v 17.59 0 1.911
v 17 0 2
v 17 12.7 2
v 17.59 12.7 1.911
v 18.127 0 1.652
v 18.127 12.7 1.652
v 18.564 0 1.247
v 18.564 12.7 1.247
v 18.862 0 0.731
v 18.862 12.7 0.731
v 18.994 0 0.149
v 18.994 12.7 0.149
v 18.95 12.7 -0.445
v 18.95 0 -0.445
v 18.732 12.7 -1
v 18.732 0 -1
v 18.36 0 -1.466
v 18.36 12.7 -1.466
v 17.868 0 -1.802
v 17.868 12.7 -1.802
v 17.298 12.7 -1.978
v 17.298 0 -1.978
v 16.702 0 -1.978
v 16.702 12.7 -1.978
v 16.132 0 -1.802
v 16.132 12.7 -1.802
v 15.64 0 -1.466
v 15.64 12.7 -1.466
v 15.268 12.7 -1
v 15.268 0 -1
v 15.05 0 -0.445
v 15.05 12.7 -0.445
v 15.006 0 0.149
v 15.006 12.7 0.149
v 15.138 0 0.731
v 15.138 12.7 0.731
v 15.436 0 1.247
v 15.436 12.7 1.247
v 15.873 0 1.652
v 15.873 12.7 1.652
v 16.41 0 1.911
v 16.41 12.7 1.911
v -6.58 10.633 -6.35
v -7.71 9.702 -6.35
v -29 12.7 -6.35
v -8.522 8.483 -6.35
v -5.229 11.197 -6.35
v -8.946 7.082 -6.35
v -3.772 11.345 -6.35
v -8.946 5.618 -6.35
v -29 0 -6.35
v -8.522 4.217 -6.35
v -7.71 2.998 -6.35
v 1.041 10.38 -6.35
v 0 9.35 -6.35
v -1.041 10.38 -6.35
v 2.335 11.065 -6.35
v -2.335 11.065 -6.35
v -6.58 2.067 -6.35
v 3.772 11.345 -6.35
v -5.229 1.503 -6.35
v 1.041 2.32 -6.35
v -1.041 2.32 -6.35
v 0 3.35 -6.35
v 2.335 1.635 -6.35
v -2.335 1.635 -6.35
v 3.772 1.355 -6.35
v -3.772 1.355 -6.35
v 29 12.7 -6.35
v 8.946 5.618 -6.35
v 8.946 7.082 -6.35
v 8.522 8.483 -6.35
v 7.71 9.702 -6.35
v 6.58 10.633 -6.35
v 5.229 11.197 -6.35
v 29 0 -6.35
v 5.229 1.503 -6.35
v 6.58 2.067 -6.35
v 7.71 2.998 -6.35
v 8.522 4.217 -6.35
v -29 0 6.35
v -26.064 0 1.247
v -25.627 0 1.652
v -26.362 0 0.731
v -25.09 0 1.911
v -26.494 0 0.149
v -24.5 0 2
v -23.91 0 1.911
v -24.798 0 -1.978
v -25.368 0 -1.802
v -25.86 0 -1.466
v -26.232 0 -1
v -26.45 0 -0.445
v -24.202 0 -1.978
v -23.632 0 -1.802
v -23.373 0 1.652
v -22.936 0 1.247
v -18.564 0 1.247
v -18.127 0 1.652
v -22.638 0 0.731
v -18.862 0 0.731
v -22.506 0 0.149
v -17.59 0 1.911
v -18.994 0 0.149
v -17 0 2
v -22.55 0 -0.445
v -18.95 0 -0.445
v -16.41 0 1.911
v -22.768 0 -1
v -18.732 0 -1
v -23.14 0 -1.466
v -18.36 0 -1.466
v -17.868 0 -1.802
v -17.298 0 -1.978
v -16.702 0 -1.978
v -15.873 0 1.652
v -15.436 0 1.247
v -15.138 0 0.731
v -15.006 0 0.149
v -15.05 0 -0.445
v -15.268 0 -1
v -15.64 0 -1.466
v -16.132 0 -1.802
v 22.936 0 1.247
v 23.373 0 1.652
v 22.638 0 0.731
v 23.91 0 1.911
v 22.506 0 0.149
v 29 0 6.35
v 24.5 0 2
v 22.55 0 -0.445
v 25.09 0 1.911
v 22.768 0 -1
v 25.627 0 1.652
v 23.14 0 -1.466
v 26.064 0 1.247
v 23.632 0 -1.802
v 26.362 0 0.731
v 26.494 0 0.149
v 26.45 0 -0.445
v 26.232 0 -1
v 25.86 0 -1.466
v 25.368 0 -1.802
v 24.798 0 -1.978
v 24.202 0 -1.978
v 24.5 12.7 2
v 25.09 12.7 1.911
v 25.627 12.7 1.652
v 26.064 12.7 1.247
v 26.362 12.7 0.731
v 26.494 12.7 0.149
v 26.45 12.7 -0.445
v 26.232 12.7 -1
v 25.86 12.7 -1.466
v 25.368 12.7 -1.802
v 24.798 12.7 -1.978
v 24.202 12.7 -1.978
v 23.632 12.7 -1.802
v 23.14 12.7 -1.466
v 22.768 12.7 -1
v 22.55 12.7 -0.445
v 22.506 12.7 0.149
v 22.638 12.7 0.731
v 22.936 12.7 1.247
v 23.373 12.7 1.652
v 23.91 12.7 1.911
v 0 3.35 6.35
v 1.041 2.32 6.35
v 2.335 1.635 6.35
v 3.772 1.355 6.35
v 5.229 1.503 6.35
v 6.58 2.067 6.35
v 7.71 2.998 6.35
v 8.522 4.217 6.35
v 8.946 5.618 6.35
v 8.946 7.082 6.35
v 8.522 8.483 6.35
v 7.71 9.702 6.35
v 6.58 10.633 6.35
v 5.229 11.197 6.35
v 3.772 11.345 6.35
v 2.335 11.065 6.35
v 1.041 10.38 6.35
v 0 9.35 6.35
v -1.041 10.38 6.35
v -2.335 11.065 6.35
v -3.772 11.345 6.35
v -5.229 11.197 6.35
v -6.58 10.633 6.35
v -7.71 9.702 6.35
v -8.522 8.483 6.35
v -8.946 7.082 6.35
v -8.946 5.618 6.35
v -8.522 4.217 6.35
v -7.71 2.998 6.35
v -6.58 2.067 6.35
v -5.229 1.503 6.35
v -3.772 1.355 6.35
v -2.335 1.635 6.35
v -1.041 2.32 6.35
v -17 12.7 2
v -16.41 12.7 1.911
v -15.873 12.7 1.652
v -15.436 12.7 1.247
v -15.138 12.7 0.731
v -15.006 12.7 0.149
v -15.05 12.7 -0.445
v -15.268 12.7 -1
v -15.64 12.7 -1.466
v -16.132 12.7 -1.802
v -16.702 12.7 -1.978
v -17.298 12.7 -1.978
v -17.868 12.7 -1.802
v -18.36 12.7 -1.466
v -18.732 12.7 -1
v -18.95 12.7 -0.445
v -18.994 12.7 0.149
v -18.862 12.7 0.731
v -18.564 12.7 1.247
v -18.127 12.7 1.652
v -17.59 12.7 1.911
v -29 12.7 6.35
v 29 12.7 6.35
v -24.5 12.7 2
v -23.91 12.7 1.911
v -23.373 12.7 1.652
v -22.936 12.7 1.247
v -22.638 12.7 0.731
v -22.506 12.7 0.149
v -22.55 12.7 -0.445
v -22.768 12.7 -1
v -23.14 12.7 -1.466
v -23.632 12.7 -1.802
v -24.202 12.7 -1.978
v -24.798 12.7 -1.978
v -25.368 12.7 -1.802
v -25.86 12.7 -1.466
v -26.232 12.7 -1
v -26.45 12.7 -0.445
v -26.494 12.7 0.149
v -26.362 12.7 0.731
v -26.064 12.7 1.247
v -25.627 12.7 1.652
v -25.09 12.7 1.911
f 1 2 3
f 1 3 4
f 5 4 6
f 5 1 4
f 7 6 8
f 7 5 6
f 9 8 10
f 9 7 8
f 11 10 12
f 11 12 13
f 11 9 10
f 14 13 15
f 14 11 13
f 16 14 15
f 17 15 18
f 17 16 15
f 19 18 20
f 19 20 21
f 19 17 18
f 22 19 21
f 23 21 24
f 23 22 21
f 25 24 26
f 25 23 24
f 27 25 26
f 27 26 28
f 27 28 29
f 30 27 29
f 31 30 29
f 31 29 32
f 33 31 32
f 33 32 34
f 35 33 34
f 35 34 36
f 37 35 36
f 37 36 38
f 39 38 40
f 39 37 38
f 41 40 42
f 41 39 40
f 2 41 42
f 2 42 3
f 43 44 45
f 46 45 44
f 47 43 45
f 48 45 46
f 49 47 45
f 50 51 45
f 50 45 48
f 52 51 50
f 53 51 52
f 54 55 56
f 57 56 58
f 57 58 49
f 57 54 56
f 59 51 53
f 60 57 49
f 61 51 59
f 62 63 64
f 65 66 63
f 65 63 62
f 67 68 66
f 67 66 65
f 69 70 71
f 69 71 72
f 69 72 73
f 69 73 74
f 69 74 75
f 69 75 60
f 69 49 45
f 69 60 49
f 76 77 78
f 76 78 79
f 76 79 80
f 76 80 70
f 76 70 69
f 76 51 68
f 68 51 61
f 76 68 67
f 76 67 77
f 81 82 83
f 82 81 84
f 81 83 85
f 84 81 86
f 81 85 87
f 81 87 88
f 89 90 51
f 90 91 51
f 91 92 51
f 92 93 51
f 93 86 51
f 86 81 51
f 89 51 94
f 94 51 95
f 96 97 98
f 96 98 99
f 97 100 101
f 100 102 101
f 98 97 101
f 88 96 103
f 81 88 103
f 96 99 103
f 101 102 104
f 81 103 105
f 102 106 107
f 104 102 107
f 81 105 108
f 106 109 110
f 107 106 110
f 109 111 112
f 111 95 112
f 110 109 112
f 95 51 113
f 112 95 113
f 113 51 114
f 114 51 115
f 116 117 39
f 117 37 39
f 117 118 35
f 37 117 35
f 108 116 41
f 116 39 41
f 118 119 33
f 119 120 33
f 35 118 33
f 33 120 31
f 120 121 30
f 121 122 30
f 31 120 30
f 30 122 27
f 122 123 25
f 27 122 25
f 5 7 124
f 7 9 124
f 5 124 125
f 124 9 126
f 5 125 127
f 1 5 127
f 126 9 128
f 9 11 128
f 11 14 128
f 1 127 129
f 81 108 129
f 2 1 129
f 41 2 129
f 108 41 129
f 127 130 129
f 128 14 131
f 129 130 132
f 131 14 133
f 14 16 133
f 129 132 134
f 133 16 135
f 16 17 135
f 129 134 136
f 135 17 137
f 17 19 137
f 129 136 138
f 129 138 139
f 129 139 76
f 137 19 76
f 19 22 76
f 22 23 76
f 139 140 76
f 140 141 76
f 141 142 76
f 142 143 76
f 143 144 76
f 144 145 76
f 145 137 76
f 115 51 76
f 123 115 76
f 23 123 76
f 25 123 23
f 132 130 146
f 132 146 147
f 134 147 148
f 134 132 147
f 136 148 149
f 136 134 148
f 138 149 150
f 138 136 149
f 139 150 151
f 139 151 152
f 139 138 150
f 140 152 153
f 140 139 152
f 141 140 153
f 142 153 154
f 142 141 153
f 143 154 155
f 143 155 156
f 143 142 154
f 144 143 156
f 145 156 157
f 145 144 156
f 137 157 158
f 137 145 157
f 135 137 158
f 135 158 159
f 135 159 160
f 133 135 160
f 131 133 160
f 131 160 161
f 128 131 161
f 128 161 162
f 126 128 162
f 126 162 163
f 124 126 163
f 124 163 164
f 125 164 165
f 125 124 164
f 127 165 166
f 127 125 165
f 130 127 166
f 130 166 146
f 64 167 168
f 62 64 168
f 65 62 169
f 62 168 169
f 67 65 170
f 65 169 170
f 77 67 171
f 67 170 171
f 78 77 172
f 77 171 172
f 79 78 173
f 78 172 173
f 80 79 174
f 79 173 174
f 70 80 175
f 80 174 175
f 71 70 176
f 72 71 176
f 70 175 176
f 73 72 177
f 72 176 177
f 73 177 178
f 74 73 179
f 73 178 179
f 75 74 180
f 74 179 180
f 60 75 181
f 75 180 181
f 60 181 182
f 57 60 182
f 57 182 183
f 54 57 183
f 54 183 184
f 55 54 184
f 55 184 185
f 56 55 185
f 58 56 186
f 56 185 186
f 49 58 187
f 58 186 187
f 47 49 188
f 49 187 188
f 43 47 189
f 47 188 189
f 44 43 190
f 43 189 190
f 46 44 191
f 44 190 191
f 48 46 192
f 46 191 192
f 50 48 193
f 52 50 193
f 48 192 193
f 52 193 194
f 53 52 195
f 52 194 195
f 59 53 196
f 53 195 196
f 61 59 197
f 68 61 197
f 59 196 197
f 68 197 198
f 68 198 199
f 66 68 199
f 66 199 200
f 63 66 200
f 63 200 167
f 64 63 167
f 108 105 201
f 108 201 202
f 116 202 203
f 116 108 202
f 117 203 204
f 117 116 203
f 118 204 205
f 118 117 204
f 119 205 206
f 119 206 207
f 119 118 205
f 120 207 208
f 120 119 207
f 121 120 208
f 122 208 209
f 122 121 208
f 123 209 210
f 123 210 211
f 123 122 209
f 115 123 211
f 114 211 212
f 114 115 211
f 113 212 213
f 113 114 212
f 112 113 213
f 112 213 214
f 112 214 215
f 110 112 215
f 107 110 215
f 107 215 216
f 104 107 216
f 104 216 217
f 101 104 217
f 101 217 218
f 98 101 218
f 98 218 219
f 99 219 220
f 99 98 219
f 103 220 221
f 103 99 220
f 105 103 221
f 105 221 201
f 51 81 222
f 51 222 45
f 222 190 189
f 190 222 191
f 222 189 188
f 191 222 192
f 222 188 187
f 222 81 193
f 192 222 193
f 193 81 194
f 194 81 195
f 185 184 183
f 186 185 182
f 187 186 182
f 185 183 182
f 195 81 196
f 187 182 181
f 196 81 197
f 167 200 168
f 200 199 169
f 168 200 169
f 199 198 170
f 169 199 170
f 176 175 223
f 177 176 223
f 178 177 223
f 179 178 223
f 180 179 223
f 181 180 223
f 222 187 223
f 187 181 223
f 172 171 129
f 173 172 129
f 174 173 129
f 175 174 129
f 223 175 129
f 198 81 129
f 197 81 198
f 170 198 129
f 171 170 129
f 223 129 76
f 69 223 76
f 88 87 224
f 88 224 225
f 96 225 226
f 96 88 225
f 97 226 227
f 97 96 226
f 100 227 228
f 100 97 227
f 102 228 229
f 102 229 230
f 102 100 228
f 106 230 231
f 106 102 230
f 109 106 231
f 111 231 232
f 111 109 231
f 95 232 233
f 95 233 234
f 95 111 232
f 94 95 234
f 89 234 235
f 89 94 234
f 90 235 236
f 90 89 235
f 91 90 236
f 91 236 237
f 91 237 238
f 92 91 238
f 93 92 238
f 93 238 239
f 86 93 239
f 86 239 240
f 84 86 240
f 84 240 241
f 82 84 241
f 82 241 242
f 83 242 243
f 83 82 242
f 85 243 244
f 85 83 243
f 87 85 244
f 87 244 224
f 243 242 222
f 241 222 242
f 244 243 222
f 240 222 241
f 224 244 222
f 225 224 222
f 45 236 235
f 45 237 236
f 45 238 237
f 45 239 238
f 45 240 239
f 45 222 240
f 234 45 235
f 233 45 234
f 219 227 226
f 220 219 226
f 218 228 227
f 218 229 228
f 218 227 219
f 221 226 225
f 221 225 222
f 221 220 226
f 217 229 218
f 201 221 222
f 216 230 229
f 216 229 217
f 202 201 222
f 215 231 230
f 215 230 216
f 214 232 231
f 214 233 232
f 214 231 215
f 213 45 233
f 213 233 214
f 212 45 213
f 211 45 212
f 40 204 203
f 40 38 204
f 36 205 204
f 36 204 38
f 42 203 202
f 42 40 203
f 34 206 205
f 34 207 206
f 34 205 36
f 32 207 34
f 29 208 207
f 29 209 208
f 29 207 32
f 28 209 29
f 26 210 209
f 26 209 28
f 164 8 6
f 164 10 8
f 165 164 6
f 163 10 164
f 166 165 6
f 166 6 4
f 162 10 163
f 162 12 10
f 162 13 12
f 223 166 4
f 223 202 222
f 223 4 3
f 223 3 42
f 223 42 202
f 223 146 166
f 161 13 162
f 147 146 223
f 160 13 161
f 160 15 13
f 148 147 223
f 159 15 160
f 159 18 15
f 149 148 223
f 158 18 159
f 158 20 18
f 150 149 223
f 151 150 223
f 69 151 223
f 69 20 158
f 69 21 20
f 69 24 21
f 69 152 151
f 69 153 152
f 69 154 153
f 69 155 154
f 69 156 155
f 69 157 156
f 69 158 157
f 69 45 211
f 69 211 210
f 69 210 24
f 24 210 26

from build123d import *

# Parameters (mm, degrees)
SKIZZE1_W                       = 58
SKIZZE1_H                       = 12.7
SKIZZE1_R                       = 2
AUFSATZ_LINEAR_AUSTRAGEN1_DEPTH = 12.7
SKIZZE2_R                       = 5
SCHNITT_LINEAR_AUSTRAGEN1_DEPTH = 12.7


with BuildPart() as part:
    # Skizze1 → Aufsatz-Linear austragen1 (new body)
    with BuildSketch(Plane(origin=(0, 0, 0), x_dir=(1, 0, 0), z_dir=(0, 1, 0))):
        Rectangle(SKIZZE1_W, SKIZZE1_H)
        with Locations(Location((-24.5, 0, 0), (0, 0, 270))):
            Circle(SKIZZE1_R, mode=Mode.SUBTRACT)
        with Locations(Location((-17, 0, 0), (0, 0, 270))):
            Circle(SKIZZE1_R, mode=Mode.SUBTRACT)
        with Locations(Location((24.5, 0, 0), (0, 0, 270))):
            Circle(SKIZZE1_R, mode=Mode.SUBTRACT)
        with Locations(Location((17, 0, 0), (0, 0, 270))):
            Circle(SKIZZE1_R, mode=Mode.SUBTRACT)
    extrude(amount=AUFSATZ_LINEAR_AUSTRAGEN1_DEPTH)

    # Skizze2 → Schnitt-Linear austragen1 (cut)
    with BuildSketch(Plane.XY.offset(6.35)):
        with Locations((-4, 6.35)):
            Circle(SKIZZE2_R)
        with Locations((4, 6.35)):
            Circle(SKIZZE2_R)
    extrude(amount=-SCHNITT_LINEAR_AUSTRAGEN1_DEPTH, mode=Mode.SUBTRACT)


solid = part.part
